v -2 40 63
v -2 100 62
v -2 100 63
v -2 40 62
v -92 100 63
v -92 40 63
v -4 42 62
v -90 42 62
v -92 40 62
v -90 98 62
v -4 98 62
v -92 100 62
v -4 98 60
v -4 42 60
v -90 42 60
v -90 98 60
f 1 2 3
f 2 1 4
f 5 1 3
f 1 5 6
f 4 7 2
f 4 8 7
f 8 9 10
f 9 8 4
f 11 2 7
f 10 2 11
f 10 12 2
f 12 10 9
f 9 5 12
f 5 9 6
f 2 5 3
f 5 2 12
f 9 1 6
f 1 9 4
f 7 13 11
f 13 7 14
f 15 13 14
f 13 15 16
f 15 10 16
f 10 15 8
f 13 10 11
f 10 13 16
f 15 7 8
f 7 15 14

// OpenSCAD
//lid
module lid(){
    translate([-92,40,0])
    {
        union(){
            translate([0,0,2])cube([90,60,1]);
            translate([2,2,0])cube([86,56,2]);
        }
    }
}
translate([0,0,60])lid();
